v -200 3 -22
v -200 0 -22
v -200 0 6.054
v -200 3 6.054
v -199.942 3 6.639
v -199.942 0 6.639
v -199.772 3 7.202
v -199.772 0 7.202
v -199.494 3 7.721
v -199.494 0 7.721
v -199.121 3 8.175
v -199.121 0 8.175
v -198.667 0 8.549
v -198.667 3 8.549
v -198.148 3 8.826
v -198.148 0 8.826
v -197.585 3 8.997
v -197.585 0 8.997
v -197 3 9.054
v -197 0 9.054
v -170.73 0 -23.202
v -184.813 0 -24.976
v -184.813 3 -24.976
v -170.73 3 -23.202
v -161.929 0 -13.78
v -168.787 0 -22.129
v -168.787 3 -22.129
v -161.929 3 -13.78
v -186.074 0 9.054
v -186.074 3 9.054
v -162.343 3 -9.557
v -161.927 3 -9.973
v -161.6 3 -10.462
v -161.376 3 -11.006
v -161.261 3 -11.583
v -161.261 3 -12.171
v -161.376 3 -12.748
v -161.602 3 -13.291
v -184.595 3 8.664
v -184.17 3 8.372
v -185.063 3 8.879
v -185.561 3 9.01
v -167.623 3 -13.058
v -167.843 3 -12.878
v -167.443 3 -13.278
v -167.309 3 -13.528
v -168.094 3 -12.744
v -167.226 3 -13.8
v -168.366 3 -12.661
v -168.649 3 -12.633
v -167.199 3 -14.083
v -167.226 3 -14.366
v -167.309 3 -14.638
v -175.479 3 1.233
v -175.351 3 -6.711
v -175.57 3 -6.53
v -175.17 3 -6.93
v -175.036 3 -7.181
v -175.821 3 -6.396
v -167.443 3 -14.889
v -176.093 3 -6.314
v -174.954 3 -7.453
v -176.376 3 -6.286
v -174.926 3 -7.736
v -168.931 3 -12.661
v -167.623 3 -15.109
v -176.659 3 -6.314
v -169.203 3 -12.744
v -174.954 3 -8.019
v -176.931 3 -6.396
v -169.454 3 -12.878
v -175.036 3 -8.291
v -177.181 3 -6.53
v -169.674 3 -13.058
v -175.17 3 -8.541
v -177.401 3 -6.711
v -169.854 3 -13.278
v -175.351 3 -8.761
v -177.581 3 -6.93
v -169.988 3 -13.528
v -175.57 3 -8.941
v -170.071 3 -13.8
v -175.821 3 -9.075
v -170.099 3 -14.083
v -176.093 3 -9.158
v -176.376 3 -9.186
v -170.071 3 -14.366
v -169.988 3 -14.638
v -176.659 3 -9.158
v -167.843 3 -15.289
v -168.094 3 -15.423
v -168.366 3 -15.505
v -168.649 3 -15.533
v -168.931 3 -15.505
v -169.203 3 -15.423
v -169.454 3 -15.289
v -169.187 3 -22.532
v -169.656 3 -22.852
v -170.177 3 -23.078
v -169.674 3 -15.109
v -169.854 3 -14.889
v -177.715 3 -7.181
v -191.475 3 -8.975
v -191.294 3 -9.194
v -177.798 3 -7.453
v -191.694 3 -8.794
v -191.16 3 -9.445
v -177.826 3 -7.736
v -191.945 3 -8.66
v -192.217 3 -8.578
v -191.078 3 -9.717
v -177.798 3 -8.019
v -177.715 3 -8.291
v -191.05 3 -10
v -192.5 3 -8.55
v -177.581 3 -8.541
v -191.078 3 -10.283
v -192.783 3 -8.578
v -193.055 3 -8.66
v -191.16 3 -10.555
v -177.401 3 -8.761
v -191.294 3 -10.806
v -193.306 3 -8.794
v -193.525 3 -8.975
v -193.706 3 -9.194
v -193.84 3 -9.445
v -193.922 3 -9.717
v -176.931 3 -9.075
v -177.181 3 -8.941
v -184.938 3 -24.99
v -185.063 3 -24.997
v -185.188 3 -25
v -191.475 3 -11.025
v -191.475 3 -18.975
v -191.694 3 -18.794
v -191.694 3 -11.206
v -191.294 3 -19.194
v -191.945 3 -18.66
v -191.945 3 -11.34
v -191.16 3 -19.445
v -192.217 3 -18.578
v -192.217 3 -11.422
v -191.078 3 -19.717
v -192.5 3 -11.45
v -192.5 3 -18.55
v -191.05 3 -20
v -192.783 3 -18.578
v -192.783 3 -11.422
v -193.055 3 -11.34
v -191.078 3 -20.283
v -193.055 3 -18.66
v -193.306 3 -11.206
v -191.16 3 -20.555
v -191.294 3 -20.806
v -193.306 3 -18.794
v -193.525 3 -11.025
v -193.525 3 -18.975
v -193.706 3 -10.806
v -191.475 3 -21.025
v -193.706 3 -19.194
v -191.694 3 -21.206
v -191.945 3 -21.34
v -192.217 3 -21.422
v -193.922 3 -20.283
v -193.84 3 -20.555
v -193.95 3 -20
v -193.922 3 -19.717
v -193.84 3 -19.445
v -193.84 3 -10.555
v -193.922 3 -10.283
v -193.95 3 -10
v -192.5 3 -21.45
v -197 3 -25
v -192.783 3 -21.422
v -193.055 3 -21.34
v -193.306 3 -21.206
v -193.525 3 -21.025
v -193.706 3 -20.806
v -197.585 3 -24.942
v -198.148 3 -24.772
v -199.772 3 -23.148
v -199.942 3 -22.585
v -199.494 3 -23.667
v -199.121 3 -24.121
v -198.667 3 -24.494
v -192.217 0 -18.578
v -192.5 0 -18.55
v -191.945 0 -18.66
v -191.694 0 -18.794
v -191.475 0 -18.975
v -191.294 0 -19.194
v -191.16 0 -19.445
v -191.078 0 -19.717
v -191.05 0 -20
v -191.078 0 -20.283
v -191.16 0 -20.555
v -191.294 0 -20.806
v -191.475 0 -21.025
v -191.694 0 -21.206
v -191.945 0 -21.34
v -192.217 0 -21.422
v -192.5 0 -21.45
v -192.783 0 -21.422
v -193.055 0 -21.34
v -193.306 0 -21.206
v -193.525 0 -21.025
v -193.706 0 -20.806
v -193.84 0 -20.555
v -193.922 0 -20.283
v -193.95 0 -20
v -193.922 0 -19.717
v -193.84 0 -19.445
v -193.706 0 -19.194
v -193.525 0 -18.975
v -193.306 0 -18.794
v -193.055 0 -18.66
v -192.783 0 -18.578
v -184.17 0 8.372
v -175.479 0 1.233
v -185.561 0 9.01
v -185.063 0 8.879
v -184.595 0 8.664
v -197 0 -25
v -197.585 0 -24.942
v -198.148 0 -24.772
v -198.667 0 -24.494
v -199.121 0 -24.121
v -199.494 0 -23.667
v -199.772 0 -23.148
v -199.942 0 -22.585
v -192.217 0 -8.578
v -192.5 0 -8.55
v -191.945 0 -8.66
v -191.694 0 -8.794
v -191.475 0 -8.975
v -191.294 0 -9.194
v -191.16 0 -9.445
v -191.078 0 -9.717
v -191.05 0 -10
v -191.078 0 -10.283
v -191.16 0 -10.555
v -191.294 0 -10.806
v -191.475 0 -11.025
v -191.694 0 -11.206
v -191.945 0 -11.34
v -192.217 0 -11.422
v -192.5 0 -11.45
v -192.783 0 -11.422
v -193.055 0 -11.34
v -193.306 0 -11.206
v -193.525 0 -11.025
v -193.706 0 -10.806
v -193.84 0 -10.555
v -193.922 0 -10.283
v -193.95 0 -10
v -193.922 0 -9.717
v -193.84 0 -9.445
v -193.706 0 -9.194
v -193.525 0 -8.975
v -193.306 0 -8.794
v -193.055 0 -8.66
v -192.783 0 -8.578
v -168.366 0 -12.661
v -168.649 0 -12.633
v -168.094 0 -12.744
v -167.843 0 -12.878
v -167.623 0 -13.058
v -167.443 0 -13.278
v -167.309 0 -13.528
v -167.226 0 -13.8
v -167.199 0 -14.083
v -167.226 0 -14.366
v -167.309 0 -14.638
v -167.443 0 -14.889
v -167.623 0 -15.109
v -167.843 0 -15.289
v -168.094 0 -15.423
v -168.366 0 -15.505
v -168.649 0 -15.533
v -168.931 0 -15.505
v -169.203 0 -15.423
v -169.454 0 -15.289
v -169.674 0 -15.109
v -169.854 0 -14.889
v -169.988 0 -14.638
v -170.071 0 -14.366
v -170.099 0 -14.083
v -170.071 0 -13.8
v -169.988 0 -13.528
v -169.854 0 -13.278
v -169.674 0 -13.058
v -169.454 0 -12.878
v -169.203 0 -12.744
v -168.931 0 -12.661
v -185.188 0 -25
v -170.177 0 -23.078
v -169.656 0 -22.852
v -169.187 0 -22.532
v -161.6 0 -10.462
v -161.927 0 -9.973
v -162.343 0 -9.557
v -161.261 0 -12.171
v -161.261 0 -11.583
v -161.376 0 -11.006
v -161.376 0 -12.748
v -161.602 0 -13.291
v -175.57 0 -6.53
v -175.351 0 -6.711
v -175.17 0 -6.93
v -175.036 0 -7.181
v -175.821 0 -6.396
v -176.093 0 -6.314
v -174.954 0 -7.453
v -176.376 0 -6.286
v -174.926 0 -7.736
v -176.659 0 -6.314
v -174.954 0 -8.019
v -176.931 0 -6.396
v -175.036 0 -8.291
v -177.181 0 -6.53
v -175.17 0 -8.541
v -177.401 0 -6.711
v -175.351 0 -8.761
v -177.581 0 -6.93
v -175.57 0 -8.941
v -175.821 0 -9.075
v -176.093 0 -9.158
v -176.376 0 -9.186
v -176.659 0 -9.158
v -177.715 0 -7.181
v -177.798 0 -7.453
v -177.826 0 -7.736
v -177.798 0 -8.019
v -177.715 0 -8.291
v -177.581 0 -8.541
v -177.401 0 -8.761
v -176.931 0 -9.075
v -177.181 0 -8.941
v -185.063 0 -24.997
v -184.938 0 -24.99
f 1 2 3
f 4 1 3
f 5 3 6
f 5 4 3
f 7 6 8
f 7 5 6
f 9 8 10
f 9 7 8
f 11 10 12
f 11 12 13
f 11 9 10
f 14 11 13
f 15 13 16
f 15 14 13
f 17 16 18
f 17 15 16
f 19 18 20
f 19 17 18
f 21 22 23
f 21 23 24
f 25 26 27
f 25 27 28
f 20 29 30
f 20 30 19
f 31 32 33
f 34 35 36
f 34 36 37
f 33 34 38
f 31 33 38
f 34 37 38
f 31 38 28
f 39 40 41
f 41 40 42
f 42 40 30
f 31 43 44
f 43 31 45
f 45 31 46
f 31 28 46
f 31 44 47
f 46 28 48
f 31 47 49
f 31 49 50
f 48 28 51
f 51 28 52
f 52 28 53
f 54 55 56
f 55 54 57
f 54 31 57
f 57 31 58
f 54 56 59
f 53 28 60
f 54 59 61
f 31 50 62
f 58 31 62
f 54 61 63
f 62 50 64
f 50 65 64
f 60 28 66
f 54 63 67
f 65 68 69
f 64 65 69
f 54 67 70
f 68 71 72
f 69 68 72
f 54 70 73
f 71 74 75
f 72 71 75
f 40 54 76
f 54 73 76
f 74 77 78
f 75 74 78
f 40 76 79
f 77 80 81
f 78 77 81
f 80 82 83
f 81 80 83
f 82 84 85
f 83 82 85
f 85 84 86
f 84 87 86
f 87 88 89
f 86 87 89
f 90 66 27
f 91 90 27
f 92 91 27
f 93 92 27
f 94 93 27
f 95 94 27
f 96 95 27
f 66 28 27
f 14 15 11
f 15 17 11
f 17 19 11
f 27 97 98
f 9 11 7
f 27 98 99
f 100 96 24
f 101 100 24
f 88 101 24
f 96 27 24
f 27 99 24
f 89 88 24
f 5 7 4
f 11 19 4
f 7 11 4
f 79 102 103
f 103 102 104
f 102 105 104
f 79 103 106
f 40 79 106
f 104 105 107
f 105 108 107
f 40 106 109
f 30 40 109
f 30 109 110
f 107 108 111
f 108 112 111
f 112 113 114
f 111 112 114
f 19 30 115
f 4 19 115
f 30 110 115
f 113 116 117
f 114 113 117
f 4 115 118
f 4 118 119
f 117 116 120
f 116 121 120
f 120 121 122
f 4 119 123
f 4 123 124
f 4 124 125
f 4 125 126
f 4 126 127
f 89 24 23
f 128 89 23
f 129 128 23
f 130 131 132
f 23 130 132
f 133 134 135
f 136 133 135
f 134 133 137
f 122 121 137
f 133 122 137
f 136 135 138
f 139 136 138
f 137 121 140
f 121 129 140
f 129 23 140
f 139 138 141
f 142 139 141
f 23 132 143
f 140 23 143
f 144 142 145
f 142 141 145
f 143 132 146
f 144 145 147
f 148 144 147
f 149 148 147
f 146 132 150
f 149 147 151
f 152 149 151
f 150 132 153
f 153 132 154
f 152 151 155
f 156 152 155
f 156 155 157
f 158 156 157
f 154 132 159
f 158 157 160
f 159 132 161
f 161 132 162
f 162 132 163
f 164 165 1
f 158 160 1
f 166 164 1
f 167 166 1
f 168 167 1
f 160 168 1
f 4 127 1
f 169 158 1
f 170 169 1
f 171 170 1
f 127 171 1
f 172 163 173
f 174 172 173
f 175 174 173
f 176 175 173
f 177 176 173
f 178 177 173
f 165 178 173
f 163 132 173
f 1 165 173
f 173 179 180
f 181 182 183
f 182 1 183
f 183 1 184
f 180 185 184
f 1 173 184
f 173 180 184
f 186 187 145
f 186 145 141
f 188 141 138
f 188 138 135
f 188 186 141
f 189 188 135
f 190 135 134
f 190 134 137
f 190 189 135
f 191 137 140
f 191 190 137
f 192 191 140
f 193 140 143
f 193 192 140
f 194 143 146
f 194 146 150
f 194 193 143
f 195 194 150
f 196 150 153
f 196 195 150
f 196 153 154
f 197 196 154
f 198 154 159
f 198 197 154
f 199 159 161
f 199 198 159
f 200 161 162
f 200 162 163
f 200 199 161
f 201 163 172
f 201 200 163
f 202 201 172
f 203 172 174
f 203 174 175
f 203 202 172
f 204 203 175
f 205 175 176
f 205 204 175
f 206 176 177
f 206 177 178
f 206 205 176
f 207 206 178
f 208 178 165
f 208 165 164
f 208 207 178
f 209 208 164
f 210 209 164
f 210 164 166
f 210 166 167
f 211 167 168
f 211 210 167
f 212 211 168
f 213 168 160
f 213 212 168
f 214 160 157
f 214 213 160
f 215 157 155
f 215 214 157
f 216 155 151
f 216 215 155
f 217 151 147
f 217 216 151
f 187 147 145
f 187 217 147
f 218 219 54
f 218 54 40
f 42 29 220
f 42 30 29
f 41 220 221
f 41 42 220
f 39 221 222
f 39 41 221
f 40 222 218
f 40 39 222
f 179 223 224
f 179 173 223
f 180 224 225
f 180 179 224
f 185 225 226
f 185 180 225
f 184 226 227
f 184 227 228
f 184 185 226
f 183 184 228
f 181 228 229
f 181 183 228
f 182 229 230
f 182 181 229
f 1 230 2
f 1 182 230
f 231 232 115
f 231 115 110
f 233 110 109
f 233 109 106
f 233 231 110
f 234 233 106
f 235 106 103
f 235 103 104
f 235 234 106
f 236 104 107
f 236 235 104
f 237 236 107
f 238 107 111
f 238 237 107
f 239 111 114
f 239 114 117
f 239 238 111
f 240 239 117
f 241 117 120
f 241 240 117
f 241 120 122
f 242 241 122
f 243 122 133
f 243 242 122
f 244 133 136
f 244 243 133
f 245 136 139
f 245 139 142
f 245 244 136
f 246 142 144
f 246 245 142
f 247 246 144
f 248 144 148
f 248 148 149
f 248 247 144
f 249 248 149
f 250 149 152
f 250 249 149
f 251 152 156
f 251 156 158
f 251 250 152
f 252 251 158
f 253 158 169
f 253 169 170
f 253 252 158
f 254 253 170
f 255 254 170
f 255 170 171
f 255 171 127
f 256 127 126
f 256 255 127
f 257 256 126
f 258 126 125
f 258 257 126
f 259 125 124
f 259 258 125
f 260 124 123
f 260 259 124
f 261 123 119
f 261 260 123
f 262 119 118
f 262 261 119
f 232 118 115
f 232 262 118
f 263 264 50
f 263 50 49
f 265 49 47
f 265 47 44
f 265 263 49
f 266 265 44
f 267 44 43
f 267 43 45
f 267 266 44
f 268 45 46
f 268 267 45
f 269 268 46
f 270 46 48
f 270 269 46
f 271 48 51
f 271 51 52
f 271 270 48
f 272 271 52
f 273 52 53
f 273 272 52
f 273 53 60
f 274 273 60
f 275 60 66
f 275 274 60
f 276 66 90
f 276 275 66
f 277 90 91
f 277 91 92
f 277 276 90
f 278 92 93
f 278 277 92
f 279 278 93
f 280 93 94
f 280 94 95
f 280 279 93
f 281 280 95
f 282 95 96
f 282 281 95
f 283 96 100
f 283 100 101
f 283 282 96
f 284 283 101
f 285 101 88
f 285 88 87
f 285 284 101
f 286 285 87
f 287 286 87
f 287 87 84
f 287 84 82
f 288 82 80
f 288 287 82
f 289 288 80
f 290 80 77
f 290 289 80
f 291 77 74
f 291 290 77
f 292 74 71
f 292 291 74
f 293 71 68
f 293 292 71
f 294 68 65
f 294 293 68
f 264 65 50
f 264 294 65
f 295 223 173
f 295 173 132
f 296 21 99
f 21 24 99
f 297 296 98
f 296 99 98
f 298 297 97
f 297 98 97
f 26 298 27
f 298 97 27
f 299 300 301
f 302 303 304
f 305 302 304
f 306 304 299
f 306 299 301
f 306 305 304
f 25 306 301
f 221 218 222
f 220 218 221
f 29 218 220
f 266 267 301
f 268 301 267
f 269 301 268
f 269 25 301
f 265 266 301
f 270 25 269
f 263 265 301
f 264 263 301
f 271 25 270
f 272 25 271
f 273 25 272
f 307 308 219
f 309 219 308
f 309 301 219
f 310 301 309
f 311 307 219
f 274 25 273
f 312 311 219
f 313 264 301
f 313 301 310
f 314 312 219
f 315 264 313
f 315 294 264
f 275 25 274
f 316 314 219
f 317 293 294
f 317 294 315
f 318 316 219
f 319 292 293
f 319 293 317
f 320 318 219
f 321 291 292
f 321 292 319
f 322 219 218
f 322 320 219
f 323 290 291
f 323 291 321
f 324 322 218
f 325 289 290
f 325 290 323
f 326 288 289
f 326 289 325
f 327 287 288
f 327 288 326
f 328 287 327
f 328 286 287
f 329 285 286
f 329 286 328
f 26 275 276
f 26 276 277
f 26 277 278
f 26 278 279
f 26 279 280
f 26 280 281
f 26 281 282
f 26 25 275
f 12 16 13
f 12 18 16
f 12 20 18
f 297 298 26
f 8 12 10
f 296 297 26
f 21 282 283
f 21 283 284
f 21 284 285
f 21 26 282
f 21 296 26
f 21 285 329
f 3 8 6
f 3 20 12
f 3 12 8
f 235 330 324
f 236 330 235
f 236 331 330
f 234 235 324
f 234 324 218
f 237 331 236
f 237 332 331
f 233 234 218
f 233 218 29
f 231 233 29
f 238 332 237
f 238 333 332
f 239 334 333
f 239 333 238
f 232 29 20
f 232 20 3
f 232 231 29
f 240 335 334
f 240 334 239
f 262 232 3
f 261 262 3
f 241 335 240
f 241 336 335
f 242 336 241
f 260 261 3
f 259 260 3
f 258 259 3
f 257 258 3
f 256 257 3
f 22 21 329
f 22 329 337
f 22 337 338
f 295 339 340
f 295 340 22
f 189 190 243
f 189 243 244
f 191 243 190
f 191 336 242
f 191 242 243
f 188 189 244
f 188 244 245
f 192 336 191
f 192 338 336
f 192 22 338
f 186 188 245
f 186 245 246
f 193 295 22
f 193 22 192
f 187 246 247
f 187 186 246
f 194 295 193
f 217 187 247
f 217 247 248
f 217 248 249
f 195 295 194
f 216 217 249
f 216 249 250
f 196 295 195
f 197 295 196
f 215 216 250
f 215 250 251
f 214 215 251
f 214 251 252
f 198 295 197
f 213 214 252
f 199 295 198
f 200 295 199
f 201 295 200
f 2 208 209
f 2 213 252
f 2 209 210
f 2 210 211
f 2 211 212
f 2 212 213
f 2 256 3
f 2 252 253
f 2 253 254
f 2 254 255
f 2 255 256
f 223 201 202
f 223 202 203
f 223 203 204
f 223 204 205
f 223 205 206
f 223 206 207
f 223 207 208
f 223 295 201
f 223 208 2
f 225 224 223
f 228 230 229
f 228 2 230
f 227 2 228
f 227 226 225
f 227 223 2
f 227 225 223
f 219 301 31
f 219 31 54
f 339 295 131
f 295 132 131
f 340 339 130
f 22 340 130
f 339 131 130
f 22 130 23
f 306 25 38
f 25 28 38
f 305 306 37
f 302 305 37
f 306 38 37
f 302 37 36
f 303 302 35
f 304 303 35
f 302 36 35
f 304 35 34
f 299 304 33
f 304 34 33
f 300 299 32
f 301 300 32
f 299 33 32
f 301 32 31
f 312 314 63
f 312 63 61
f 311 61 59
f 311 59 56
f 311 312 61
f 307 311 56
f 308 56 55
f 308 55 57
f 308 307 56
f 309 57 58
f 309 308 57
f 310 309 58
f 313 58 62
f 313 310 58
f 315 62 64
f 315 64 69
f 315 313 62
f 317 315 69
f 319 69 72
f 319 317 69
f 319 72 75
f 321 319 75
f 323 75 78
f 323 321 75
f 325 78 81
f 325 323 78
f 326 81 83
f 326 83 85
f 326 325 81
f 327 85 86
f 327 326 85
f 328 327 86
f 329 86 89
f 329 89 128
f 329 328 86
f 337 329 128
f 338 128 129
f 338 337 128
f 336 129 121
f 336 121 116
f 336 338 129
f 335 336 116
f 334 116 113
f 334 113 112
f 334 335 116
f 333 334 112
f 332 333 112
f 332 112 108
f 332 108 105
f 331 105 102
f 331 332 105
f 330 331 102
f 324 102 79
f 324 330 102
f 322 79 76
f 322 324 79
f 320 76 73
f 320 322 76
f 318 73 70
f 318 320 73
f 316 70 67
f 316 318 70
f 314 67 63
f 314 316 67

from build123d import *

# Parameters (mm, degrees)
SKETCH_1_R      = 1.45
EXTRUDE_1_DEPTH = 3
FILLET_1_R      = 3


with BuildPart() as part:
    # 草图1 → 凸台-拉伸1 (new body)
    with BuildSketch(Plane(origin=(0, 0, 0), x_dir=(1, 0, 0), z_dir=(0, 1, 0))):
        Polygon((-200, 25), (-185, 25), (-169.545454545, 23.052363238), (-160.024381788, 11.461454148), (-175.478927243, -1.233309529), (-185, -9.054165144), (-200, -9.054165144), (-200, -4.917341068), align=None)
        with Locations(Location((-176.375827258, 7.735835936, 0), (0, 0, 270))):
            Circle(SKETCH_1_R, mode=Mode.SUBTRACT)
        with Locations(Location((-168.648554531, 14.083217774, 0), (0, 0, 270))):
            Circle(SKETCH_1_R, mode=Mode.SUBTRACT)
        with Locations(Location((-192.5, 20, 0), (0, 0, 270))):
            Circle(SKETCH_1_R, mode=Mode.SUBTRACT)
        with Locations(Location((-192.5, 10, 0), (0, 0, 270))):
            Circle(SKETCH_1_R, mode=Mode.SUBTRACT)
    extrude(amount=EXTRUDE_1_DEPTH)

    # 圆角1
    fillet_1_edges = [part.edges().sort_by_distance(p)[0] for p in [
        (-185, 1.5, 9.054165144),
        (-200, 1.5, 9.054165144),
        (-200, 1.5, -25),
        (-185, 1.5, -25),
        (-169.545454545, 1.5, -23.052363238),
        (-160.024381788, 1.5, -11.461454148),
    ]]
    fillet(fillet_1_edges, radius=FILLET_1_R)


solid = part.part
